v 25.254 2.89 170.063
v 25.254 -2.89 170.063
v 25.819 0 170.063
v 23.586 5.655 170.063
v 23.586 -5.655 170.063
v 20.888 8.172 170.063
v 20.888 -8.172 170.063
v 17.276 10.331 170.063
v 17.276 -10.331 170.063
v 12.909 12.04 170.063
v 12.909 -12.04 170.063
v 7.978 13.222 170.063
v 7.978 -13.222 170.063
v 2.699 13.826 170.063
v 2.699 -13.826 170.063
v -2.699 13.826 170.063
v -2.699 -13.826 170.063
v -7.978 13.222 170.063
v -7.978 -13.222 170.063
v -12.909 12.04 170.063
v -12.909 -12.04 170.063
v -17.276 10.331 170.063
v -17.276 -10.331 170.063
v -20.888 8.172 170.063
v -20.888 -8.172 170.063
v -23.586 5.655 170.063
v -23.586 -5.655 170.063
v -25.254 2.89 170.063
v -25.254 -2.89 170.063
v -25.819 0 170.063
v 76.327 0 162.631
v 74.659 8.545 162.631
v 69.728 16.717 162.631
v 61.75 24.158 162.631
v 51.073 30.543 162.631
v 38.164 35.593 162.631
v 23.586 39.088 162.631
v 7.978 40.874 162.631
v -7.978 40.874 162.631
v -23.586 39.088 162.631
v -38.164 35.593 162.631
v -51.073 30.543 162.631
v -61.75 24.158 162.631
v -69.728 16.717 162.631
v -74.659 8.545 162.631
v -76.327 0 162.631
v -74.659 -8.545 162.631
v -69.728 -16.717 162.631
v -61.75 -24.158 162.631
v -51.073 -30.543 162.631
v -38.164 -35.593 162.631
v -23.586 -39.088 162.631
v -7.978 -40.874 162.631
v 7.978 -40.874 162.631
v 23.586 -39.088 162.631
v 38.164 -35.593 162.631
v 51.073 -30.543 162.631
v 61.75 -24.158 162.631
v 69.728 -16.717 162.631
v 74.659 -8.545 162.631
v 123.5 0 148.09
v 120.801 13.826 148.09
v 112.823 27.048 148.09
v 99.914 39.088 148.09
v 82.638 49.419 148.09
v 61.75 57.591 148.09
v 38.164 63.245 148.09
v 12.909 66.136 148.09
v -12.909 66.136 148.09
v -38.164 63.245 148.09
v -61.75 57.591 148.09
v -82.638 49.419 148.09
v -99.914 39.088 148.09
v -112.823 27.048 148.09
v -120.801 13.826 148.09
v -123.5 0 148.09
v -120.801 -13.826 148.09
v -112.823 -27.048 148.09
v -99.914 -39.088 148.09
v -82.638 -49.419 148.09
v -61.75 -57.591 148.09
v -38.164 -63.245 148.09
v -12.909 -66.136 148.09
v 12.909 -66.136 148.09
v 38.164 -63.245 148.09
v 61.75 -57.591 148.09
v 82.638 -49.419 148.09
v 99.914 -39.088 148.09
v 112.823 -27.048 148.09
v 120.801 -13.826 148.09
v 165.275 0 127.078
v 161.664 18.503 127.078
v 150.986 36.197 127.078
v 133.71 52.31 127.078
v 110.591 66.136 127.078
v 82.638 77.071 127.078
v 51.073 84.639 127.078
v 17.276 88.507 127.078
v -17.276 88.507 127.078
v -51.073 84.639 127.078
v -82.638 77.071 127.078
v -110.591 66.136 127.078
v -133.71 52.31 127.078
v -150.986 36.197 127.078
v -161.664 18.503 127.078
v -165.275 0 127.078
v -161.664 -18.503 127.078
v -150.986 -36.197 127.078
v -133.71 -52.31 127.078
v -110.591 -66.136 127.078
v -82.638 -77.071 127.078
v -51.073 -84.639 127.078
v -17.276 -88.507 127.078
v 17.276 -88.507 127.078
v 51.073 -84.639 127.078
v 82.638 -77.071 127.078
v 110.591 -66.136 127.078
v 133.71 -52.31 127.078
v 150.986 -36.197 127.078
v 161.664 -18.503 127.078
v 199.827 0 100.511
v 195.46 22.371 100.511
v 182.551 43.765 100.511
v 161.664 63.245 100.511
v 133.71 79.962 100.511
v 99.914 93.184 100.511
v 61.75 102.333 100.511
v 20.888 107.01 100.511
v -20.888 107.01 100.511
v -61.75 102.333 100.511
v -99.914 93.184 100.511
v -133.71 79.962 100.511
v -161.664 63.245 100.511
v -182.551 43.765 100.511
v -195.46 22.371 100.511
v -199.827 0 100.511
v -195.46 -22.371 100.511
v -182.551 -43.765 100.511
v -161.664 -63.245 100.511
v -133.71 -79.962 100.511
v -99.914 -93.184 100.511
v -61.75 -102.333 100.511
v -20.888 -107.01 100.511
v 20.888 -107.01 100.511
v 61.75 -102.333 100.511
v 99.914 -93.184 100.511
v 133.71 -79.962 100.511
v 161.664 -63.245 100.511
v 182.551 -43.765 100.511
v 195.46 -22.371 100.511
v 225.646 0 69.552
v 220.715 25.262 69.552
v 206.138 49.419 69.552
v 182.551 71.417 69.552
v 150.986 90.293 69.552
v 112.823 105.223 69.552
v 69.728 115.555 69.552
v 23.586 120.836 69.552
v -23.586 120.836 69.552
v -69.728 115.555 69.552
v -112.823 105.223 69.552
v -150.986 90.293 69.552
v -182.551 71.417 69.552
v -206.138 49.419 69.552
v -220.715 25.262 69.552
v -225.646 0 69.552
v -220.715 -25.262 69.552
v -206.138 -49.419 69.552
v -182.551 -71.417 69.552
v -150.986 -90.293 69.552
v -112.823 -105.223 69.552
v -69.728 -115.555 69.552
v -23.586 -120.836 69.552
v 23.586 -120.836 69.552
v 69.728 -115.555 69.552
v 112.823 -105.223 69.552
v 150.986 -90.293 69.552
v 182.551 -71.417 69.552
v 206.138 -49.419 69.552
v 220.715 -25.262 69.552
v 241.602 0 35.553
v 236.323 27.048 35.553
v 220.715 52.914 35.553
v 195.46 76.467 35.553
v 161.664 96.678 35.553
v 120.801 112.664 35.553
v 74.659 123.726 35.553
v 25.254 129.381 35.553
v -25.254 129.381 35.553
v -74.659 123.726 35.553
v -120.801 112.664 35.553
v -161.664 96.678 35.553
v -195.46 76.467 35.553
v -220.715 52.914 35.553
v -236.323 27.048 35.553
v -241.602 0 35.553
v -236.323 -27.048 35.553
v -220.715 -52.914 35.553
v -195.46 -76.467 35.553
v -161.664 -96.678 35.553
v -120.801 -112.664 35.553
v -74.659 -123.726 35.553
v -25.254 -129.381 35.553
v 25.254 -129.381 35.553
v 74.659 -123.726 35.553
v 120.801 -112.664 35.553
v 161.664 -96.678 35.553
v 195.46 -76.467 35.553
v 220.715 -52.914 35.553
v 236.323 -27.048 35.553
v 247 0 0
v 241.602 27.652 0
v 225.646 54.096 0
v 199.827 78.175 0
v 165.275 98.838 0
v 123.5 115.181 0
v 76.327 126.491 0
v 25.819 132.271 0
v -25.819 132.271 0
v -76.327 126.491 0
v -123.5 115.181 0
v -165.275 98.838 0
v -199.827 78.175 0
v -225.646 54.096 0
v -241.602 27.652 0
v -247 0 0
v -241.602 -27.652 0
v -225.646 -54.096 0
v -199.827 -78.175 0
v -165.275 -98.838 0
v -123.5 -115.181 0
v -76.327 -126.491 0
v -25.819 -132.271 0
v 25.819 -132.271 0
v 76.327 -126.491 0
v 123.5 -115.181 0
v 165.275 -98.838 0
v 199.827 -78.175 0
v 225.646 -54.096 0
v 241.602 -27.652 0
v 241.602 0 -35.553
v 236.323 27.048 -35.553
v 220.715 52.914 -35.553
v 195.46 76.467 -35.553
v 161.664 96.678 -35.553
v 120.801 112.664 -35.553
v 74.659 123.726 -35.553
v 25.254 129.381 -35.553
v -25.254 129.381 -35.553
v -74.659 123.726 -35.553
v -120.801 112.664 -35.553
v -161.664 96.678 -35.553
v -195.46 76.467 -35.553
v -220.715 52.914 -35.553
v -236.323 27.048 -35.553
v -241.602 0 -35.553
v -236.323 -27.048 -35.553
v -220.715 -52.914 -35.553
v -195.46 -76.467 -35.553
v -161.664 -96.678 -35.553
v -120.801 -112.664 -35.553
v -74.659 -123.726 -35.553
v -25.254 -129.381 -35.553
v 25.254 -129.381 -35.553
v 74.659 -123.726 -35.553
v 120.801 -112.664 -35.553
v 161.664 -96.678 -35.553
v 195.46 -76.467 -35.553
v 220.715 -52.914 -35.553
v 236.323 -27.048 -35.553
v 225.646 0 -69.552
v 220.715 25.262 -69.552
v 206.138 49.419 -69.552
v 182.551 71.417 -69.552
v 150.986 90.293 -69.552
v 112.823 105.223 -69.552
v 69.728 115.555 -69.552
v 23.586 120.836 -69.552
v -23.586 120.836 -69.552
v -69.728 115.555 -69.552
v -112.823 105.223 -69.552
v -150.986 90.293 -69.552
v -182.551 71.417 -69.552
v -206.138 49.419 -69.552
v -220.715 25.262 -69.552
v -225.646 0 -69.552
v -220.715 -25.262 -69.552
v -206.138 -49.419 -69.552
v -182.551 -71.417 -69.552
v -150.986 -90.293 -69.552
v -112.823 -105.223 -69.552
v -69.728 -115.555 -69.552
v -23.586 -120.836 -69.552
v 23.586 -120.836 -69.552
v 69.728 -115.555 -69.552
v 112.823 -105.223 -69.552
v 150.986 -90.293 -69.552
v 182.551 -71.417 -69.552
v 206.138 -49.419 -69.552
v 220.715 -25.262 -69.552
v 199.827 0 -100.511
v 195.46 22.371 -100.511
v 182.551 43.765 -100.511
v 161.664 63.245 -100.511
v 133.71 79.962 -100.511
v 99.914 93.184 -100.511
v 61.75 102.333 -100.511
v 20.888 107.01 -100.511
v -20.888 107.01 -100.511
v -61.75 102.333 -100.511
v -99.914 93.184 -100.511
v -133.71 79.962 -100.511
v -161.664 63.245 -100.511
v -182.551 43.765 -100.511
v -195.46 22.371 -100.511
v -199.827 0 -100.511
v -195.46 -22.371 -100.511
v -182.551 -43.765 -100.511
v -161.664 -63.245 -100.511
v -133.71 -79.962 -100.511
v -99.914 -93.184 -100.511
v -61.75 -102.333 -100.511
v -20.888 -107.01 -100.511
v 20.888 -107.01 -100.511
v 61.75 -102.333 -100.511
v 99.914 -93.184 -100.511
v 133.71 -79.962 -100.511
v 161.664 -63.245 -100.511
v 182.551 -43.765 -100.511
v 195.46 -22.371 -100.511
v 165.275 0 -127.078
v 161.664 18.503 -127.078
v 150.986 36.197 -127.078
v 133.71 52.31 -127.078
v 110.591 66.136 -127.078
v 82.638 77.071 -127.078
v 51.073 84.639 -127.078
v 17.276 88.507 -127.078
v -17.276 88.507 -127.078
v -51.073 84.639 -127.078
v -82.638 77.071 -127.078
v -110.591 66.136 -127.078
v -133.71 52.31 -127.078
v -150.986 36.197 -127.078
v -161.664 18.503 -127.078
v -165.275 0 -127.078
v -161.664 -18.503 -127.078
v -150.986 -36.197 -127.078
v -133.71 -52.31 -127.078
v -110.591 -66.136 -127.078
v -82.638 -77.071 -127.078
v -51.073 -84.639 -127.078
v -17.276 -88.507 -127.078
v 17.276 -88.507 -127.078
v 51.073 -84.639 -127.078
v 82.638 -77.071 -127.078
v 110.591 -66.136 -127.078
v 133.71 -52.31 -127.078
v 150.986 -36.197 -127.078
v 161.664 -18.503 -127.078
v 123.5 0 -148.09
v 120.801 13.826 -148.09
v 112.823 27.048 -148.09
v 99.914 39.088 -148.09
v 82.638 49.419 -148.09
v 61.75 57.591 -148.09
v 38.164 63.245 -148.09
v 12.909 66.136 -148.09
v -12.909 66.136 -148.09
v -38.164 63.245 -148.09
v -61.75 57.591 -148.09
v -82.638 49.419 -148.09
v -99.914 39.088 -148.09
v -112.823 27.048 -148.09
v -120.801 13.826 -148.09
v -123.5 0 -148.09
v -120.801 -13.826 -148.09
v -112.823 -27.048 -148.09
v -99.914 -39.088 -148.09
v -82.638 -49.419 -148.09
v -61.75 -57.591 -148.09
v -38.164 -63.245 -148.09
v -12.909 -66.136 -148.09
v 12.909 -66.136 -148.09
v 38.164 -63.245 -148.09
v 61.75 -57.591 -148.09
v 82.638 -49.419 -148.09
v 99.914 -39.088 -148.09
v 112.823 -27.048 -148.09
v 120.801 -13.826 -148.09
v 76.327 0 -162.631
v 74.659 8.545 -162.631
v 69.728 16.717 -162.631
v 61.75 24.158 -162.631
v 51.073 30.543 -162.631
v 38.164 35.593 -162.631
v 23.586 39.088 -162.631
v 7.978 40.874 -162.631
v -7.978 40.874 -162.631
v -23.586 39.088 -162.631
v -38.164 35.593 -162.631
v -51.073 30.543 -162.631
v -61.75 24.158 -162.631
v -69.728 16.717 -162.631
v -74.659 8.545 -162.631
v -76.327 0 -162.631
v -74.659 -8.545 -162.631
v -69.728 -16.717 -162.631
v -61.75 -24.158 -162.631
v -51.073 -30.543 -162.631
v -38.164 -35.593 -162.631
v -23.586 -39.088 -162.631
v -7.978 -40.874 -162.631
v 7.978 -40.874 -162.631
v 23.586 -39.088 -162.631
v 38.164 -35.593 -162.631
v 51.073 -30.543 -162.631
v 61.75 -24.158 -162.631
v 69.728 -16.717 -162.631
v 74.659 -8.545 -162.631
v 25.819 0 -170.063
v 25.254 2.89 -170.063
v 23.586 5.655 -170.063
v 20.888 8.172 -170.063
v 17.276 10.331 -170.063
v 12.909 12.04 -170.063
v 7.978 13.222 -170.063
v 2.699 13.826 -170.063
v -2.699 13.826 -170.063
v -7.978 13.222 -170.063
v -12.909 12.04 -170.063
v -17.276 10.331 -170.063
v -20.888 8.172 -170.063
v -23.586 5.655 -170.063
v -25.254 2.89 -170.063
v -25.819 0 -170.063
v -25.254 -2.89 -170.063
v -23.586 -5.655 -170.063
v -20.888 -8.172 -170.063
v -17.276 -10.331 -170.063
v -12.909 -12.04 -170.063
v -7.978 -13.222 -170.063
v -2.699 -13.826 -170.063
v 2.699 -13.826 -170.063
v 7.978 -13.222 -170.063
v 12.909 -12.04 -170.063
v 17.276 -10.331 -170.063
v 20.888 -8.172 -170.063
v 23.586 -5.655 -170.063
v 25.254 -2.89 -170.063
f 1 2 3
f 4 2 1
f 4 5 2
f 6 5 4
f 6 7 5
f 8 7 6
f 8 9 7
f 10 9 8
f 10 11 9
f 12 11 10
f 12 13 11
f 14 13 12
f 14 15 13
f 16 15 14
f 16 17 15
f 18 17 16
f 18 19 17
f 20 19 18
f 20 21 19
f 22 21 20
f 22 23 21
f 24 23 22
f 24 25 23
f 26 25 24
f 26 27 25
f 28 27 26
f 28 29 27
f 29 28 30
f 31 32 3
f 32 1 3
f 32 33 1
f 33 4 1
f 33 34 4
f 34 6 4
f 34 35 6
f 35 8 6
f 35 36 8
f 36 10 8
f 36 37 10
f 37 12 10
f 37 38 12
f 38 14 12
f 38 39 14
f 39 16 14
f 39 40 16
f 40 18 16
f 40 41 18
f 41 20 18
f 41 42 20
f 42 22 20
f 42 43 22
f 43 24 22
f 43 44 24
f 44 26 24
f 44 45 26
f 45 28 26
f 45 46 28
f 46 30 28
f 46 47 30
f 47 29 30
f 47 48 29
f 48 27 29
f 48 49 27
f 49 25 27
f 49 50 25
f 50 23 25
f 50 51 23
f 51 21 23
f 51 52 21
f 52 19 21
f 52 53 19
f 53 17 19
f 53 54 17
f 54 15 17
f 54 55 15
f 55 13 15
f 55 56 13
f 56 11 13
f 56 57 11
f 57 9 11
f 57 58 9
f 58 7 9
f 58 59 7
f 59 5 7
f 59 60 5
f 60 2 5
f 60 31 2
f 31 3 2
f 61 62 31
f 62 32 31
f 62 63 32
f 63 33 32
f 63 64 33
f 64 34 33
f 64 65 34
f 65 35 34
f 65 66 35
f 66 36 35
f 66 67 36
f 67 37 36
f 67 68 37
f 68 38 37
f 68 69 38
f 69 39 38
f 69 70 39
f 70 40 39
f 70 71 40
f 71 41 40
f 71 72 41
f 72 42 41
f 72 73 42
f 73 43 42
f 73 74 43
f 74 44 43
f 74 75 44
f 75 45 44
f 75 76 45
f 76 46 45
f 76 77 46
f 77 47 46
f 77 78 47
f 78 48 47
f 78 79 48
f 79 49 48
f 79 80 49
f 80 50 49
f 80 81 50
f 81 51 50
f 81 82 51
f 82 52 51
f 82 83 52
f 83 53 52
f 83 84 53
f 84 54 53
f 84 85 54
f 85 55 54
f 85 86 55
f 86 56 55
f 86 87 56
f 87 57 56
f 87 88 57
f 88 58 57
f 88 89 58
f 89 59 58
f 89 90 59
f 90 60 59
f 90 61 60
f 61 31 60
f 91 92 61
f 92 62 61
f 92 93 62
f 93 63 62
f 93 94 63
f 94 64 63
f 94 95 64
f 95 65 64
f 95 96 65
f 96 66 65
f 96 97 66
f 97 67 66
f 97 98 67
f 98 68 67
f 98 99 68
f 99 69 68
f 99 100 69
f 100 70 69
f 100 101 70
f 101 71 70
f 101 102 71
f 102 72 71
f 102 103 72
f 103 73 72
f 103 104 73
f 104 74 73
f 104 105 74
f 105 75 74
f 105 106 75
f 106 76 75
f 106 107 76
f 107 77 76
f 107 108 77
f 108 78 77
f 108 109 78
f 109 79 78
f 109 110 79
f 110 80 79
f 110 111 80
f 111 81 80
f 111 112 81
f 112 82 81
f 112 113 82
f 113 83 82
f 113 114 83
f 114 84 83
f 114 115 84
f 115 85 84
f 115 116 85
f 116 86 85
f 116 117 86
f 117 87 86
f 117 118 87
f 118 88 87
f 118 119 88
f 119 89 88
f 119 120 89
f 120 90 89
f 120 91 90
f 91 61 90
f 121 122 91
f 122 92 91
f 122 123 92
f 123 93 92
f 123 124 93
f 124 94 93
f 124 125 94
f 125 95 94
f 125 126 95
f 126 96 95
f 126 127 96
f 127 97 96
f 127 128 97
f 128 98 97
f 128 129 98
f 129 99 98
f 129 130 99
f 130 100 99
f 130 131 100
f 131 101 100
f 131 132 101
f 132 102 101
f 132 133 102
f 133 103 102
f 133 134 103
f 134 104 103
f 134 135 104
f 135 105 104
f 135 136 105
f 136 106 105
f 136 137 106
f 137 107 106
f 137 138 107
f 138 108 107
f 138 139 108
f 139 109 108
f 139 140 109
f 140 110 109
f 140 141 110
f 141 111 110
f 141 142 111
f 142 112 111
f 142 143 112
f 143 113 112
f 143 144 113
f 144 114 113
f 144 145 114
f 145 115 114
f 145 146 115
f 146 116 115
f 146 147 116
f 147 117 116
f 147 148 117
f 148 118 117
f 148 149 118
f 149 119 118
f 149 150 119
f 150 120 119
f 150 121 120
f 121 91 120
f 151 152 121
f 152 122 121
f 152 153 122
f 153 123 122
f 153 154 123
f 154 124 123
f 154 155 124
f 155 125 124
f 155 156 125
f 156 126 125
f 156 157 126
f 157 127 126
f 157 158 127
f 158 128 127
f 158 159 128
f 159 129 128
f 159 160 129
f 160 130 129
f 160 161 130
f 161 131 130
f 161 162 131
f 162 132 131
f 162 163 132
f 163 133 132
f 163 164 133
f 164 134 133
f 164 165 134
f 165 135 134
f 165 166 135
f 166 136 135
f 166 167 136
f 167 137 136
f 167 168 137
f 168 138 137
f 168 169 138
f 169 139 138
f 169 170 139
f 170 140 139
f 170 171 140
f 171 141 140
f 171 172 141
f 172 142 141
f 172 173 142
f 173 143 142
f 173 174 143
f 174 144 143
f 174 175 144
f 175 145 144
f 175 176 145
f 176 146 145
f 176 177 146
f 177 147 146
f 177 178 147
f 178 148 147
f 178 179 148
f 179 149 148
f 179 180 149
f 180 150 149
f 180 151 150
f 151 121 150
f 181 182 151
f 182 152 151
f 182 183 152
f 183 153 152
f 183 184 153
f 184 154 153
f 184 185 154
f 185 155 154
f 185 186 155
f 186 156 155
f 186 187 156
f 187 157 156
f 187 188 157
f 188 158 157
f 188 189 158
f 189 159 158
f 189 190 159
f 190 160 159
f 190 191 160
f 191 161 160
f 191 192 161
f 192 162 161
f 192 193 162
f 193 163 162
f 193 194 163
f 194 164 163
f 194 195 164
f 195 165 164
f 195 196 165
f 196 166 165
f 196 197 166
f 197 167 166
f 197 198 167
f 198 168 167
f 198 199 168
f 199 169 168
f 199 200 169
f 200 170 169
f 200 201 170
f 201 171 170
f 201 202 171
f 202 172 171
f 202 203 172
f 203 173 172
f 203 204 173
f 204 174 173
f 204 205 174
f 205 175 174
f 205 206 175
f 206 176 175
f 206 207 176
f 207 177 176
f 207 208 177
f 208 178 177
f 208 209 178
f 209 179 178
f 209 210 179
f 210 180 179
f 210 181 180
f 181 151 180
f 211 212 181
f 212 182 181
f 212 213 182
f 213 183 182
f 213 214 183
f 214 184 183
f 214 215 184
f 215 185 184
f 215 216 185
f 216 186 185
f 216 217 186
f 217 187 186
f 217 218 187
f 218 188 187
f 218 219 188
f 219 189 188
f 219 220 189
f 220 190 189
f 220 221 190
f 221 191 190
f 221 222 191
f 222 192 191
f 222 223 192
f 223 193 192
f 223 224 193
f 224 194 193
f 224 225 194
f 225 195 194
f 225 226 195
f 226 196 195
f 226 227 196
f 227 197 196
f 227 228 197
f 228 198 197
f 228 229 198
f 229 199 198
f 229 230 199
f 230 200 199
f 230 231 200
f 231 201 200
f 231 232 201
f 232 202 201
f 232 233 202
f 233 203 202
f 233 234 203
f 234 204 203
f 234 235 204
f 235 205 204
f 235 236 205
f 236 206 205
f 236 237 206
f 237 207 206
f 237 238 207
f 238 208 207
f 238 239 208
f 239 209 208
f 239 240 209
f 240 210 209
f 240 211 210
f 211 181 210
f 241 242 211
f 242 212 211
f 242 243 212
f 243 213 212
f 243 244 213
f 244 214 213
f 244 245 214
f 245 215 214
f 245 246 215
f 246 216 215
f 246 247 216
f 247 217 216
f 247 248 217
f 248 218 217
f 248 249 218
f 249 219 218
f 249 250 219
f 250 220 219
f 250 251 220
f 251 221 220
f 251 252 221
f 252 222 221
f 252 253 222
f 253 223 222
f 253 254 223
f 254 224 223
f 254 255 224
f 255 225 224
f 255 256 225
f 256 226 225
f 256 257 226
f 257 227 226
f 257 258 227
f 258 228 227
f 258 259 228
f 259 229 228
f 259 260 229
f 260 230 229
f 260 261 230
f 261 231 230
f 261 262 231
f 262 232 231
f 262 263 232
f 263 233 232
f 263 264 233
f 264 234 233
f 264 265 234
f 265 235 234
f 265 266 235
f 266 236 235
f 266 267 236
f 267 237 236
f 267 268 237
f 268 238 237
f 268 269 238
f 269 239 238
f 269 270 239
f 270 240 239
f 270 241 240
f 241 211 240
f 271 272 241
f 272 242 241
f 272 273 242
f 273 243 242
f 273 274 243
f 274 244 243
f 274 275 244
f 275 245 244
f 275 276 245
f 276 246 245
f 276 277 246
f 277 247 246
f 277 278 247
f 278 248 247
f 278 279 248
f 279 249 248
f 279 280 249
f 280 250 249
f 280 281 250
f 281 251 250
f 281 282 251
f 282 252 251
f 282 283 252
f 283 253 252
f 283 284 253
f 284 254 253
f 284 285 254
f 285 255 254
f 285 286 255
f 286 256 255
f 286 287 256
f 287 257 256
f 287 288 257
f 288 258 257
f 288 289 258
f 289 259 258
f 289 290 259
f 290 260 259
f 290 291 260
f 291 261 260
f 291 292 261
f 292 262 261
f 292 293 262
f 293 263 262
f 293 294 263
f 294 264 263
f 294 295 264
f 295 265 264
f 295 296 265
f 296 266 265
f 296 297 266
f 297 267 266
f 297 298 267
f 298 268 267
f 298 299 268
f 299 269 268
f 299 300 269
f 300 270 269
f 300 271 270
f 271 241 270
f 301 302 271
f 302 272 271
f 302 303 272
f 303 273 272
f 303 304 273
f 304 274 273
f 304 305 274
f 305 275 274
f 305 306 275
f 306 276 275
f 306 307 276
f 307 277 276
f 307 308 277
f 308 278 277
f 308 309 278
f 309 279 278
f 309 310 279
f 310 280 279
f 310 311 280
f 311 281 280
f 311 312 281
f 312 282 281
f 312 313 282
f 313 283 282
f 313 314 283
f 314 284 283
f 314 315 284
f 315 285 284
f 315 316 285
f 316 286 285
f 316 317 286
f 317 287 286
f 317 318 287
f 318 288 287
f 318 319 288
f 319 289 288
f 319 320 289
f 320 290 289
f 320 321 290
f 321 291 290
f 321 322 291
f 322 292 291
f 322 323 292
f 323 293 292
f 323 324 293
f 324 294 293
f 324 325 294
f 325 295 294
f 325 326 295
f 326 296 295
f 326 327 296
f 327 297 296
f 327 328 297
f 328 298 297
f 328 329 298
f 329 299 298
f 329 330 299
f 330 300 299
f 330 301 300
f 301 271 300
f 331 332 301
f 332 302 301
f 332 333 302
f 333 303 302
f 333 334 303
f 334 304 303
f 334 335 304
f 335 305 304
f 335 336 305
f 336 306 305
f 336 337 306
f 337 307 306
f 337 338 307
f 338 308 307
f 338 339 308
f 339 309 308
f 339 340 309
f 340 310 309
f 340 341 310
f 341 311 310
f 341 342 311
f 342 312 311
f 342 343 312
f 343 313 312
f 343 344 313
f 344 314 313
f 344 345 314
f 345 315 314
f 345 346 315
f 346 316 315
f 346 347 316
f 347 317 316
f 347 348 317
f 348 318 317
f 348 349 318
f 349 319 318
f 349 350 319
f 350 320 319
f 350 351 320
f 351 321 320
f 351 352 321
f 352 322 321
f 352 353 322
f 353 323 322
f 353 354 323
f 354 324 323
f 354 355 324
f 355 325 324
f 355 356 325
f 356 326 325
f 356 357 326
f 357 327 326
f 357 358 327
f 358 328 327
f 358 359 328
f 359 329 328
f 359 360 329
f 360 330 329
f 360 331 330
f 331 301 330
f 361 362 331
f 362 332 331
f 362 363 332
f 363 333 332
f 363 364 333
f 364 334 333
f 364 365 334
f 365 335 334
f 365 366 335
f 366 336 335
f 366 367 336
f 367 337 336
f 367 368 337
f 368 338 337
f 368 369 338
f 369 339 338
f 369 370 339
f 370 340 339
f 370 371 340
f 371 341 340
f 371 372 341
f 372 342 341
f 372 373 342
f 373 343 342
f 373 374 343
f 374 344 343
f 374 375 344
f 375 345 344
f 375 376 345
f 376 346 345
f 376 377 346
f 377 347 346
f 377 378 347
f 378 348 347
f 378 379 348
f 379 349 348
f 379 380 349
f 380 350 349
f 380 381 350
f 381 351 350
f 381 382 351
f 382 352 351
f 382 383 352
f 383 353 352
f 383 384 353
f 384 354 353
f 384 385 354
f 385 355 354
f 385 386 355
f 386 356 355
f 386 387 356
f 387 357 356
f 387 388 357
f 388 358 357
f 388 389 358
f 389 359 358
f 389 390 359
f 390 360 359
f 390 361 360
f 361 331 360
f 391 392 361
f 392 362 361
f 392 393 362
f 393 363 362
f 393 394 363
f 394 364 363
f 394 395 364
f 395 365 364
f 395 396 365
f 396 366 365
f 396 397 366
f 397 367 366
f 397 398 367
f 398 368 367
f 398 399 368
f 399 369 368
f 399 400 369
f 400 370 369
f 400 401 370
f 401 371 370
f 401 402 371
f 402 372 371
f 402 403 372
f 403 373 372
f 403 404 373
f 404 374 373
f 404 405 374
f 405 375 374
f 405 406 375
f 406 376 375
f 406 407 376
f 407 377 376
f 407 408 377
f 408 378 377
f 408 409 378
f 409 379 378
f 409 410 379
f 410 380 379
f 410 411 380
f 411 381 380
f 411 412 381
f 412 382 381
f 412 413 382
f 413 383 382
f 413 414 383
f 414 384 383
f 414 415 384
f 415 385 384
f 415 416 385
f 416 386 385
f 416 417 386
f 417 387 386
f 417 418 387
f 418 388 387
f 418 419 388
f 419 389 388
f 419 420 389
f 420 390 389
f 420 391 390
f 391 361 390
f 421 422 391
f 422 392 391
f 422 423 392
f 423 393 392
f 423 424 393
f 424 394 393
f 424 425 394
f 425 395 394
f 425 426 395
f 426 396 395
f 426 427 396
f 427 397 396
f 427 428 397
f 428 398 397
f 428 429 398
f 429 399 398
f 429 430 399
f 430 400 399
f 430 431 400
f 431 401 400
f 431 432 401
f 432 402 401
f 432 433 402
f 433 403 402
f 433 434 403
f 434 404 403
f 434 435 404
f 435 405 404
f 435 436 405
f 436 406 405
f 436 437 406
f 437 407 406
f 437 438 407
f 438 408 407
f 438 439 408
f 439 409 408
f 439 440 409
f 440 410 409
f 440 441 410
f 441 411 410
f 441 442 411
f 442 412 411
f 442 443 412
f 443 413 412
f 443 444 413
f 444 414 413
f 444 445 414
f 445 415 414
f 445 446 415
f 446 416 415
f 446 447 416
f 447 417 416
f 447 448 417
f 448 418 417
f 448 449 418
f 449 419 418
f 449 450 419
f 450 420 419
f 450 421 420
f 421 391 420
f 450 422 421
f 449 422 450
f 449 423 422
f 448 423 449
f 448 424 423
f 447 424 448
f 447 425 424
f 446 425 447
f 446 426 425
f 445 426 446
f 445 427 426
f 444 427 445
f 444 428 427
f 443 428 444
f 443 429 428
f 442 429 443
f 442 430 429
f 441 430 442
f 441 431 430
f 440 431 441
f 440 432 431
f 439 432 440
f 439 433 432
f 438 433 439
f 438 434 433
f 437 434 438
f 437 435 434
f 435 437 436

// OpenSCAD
// Generated by SolidPython 1.0.1 on 2020-07-29 00:46:50


scale(v = [13, 7, 9]) {
	sphere(r = 19);
}
/***********************************************
*********      SolidPython code:      **********
************************************************
 
# import packages: SolidPython
from solid import *
from solid.utils import *
from itertools import chain, combinations, permutations


class Resize:

    def __init__(self, scad_file):
        self.scad_file = scad_file
        #self.scad_file = import_scad(scad_file)
        # cone/cylinder param:
        self.r1 = 0
        self.r2 = 0
        self.h = 0
        # rectangular prism param:
        self.w = 0
        self.l = 0
        # ellipse param:
        self.r = 0

    # import OpenScad code (file name corresponds to shape)


    # classify shape + parameters
    def assign(self, param1, param2, param3):
        if self.scad_file == 'cone.scad':
            self.r1 = param1
            self.r2 = param2
            self.h = param3
        elif self.scad_file == 'cylinder.scad':
            self.r1 = param1
            self.r2 = param2
            self.h = param3
        elif self.scad_file == 'rectangularPrism.scad':
            self.h = param1
            self.l = param2
            self.w = param3
        else:
            self.r = param1
            self.h = param2

    # resize parameters
    def iterate(self):
        x = range(3, 20, 2)
        i = 1
        if self.scad_file == 'cone.scad':
            tempList = list(permutations(x, 2))
            for temp in tempList:
                param1 = temp[0]
                param2 = temp[1]
                filepath = 'produced_scad_files/' + 'cone' + str(param1) + '_' + str(param2) + '_' + '.scad'
                scad_render_to_file(cylinder(h=param1, r1=param2, r2=0), filepath)

        elif self.scad_file == 'cylinder.scad':
            tempList = list(permutations(x, 3))
            for temp in tempList:
                param1 = temp[0]
                param2 = temp[1]
                filepath = 'produced_scad_files/' + 'cylinder' + str(param1) + '_' + str(param2) + '_' + '.scad'
                scad_render_to_file(cylinder(h=param1, r1=param2, r2=param2), filepath)

        elif self.scad_file == 'rectangularPrism.scad':
            tempList = list(permutations(x, 3))
            for temp in tempList:
                param1 = temp[0]
                param2 = temp[1]
                param3 = temp[2]
                filepath = 'produced_scad_files/' + 'rectangularPrism' + str(param1) + '_' + str(param2) + '_' + str(
                    param3) + '.scad'
                scad_render_to_file(cube(size=(param1, param2, param3)), filepath)

        elif self.scad_file == 'ellipse.scad':
            tempList = list(permutations(x, 4))
            for temp in tempList:
                param1 = temp[0]
                param2 = temp[1]
                param3 = temp[2]
                param4 = temp[3]
                filepath = 'produced_scad_files/' + 'ellipse' + str(param1) + '_' + str(param2) + '_' + str(param3) + '_' + str(param4) + '.scad'
                scad_render_to_file(scale([param1, param2, param3])(sphere(r=param4)), filepath)

    def render_to_scadfile(self):
        scad_render_to_file(scad, 'example.scad') 
 
************************************************/
